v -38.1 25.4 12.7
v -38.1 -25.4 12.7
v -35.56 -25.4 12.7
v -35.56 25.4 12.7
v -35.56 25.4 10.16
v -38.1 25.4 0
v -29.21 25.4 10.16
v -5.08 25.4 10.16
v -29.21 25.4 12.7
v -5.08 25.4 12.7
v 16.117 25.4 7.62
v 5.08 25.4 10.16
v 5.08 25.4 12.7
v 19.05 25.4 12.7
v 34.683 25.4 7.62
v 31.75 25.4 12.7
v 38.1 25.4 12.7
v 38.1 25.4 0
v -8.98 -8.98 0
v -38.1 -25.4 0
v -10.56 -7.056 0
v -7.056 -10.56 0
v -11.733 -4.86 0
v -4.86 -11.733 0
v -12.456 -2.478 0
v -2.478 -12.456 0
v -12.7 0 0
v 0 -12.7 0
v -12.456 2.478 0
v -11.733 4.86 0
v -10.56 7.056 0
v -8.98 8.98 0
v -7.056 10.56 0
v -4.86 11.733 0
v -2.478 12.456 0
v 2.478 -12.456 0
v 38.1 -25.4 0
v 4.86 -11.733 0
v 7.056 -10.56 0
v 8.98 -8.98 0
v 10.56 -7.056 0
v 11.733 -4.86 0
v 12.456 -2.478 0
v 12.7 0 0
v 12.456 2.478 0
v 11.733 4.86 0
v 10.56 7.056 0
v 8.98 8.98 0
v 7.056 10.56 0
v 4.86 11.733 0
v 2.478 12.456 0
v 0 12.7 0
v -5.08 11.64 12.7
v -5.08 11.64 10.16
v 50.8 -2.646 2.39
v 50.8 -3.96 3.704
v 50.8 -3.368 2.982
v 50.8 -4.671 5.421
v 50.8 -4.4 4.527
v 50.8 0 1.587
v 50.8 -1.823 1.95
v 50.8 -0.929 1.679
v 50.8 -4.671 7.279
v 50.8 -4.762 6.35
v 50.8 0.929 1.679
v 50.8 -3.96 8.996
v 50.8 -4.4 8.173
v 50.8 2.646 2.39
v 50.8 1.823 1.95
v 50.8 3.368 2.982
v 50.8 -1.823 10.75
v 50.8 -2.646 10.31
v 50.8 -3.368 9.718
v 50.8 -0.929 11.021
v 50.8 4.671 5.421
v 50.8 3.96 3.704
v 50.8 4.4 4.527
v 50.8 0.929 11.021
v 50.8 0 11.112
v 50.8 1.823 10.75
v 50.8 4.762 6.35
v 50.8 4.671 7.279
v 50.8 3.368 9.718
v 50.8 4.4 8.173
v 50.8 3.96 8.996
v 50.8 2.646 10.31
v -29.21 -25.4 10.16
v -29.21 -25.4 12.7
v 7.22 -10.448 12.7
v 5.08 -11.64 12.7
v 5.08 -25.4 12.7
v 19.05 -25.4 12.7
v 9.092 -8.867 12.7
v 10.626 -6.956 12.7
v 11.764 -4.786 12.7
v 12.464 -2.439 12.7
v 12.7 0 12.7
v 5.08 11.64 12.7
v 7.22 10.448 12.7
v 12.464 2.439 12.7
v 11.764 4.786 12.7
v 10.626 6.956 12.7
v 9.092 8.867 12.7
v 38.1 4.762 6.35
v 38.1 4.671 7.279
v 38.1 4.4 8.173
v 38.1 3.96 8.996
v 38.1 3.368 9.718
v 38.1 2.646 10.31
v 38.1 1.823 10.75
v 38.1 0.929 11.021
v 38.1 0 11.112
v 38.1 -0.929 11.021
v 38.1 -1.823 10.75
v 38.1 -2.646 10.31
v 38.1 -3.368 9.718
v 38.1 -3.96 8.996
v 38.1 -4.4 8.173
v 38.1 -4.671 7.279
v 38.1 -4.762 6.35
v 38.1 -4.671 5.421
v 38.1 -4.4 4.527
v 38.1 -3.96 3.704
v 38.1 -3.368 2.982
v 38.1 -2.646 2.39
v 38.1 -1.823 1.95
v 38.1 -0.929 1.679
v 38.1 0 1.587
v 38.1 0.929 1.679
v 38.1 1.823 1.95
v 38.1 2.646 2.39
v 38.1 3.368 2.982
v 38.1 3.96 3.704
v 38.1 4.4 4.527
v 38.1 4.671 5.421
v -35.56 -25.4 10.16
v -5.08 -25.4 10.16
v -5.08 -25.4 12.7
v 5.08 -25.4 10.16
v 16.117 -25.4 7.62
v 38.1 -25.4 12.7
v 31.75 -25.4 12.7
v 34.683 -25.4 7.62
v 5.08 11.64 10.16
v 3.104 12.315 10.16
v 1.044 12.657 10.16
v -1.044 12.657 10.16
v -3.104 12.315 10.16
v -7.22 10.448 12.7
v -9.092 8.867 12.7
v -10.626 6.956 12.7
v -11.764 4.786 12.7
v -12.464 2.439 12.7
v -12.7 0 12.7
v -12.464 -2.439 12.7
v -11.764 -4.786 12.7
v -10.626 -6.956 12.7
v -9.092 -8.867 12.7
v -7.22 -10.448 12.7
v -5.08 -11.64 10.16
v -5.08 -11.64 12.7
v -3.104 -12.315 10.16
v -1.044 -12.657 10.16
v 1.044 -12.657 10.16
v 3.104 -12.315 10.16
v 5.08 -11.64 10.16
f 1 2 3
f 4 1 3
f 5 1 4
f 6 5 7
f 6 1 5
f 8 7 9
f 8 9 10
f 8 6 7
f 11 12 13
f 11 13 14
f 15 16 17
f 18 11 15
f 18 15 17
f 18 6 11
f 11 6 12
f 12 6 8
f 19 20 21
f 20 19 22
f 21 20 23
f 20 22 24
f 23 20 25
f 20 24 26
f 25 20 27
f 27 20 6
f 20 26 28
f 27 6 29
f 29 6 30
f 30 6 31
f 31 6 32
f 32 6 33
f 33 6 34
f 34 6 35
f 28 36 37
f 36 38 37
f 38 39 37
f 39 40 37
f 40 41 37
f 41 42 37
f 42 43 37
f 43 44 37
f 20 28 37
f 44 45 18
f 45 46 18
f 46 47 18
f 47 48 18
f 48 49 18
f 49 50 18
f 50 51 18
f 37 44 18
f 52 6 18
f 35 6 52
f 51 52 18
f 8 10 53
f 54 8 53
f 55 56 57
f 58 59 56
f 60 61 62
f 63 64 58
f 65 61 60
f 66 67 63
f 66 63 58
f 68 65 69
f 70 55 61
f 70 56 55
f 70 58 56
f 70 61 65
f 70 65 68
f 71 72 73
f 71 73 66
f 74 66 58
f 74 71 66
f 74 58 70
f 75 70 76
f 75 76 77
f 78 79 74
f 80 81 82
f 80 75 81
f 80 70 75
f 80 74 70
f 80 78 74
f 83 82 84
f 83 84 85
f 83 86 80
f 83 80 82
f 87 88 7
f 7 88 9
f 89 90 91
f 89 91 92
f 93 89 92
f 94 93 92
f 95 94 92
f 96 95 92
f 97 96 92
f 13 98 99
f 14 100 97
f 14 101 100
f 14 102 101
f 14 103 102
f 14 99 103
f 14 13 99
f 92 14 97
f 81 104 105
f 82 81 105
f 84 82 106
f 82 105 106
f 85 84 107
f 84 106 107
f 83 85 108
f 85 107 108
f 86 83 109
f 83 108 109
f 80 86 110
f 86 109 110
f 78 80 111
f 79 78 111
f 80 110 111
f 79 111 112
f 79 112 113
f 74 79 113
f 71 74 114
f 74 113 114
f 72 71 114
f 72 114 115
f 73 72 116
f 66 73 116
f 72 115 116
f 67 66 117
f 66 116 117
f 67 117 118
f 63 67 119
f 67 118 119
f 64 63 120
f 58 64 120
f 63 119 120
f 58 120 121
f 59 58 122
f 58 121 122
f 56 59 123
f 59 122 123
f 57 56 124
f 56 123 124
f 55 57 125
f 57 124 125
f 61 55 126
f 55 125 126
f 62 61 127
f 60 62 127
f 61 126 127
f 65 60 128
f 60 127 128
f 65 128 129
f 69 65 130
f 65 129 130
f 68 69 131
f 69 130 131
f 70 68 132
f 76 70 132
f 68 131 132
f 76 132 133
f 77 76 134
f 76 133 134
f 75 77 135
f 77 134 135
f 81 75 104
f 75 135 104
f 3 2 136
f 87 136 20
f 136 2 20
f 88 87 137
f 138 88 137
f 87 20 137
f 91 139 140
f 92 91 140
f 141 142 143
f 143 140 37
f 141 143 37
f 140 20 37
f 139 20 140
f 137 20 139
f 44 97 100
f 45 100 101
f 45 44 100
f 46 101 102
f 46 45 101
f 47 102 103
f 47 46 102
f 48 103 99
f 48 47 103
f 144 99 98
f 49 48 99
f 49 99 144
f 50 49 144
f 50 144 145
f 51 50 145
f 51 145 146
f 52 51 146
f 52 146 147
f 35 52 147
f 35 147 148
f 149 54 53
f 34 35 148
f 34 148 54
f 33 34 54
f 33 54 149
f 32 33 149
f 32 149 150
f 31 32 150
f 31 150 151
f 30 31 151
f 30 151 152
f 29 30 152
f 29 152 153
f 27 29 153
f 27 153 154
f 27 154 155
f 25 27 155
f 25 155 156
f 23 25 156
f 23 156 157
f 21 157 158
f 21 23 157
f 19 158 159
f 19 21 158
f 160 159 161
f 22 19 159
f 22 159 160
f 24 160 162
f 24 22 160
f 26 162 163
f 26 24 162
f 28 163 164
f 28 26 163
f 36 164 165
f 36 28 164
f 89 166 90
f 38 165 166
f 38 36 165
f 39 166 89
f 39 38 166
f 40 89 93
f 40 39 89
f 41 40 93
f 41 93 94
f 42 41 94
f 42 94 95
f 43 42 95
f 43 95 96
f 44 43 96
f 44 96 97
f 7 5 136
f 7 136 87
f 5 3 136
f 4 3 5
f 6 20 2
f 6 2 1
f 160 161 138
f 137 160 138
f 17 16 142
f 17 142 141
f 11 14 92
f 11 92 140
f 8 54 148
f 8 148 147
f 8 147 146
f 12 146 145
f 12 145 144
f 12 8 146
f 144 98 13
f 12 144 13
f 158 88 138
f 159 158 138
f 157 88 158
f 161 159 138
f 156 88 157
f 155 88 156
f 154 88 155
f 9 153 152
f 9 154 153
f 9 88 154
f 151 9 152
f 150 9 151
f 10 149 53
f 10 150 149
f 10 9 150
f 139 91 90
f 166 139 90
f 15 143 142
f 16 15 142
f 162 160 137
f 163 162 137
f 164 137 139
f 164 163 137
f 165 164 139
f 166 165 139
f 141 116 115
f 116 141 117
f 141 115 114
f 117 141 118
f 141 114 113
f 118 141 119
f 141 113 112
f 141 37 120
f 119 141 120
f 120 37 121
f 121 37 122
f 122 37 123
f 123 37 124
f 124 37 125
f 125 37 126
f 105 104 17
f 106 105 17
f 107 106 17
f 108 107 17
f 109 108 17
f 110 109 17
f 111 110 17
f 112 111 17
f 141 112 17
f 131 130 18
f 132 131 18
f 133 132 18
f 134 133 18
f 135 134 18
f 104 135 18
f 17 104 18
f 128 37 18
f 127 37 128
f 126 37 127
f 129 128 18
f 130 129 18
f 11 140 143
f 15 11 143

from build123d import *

# Parameters (mm, degrees)
F0_W     = 76.2
F0_H     = 50.8
F0_R     = 12.7
F1_DEPTH = 12.7
F2_W     = 6.35
F2_H     = 50.8
F3_DEPTH = 2.54
F5_DEPTH = 50.801
F6_R     = 4.7625
F7_DEPTH = 12.7


with BuildPart() as f1:
    # F0 (on Top) → F1 (new body)
    with BuildSketch(Plane.XY):
        Rectangle(F0_W, F0_H)
        Circle(F0_R, mode=Mode.SUBTRACT)
    extrude(amount=F1_DEPTH)

    # F2 (on face) → F3 (cut)
    with BuildSketch(Plane.XY.offset(12.7)):
        with Locations((-32.385, 0)):
            Rectangle(F2_W, F2_H)
        with BuildLine():
            Line((-5.08, -11.639742), (-5.08, -25.4))
            Line((-5.08, -25.4), (5.08, -25.4))
            Line((5.08, -25.4), (5.08, -11.639742))
            ThreePointArc((5.08, -11.639742), (0, -12.7), (-5.08, -11.639742))
        make_face()
        with BuildLine():
            Line((5.08, 25.4), (-5.08, 25.4))
            Line((-5.08, 25.4), (-5.08, 11.639742))
            ThreePointArc((-5.08, 11.639742), (0, 12.7), (5.08, 11.639742))
            Line((5.08, 11.639742), (5.08, 25.4))
        make_face()
    extrude(amount=-F3_DEPTH, mode=Mode.SUBTRACT)

    # F4 (on face) → F5 (cut, through all)
    with BuildSketch(Plane.XZ.offset(25.4)):
        Polygon((31.75, 12.7), (19.05, 12.7), (16.117061, 7.62), (34.682939, 7.62), align=None)
    extrude(amount=-F5_DEPTH, mode=Mode.SUBTRACT)

    # F6 (on face) → F7 (join)
    with BuildSketch(Plane.YZ.offset(38.1)):
        with Locations((0, 6.35)):
            Circle(F6_R)
    extrude(amount=F7_DEPTH)


solid = f1.part
